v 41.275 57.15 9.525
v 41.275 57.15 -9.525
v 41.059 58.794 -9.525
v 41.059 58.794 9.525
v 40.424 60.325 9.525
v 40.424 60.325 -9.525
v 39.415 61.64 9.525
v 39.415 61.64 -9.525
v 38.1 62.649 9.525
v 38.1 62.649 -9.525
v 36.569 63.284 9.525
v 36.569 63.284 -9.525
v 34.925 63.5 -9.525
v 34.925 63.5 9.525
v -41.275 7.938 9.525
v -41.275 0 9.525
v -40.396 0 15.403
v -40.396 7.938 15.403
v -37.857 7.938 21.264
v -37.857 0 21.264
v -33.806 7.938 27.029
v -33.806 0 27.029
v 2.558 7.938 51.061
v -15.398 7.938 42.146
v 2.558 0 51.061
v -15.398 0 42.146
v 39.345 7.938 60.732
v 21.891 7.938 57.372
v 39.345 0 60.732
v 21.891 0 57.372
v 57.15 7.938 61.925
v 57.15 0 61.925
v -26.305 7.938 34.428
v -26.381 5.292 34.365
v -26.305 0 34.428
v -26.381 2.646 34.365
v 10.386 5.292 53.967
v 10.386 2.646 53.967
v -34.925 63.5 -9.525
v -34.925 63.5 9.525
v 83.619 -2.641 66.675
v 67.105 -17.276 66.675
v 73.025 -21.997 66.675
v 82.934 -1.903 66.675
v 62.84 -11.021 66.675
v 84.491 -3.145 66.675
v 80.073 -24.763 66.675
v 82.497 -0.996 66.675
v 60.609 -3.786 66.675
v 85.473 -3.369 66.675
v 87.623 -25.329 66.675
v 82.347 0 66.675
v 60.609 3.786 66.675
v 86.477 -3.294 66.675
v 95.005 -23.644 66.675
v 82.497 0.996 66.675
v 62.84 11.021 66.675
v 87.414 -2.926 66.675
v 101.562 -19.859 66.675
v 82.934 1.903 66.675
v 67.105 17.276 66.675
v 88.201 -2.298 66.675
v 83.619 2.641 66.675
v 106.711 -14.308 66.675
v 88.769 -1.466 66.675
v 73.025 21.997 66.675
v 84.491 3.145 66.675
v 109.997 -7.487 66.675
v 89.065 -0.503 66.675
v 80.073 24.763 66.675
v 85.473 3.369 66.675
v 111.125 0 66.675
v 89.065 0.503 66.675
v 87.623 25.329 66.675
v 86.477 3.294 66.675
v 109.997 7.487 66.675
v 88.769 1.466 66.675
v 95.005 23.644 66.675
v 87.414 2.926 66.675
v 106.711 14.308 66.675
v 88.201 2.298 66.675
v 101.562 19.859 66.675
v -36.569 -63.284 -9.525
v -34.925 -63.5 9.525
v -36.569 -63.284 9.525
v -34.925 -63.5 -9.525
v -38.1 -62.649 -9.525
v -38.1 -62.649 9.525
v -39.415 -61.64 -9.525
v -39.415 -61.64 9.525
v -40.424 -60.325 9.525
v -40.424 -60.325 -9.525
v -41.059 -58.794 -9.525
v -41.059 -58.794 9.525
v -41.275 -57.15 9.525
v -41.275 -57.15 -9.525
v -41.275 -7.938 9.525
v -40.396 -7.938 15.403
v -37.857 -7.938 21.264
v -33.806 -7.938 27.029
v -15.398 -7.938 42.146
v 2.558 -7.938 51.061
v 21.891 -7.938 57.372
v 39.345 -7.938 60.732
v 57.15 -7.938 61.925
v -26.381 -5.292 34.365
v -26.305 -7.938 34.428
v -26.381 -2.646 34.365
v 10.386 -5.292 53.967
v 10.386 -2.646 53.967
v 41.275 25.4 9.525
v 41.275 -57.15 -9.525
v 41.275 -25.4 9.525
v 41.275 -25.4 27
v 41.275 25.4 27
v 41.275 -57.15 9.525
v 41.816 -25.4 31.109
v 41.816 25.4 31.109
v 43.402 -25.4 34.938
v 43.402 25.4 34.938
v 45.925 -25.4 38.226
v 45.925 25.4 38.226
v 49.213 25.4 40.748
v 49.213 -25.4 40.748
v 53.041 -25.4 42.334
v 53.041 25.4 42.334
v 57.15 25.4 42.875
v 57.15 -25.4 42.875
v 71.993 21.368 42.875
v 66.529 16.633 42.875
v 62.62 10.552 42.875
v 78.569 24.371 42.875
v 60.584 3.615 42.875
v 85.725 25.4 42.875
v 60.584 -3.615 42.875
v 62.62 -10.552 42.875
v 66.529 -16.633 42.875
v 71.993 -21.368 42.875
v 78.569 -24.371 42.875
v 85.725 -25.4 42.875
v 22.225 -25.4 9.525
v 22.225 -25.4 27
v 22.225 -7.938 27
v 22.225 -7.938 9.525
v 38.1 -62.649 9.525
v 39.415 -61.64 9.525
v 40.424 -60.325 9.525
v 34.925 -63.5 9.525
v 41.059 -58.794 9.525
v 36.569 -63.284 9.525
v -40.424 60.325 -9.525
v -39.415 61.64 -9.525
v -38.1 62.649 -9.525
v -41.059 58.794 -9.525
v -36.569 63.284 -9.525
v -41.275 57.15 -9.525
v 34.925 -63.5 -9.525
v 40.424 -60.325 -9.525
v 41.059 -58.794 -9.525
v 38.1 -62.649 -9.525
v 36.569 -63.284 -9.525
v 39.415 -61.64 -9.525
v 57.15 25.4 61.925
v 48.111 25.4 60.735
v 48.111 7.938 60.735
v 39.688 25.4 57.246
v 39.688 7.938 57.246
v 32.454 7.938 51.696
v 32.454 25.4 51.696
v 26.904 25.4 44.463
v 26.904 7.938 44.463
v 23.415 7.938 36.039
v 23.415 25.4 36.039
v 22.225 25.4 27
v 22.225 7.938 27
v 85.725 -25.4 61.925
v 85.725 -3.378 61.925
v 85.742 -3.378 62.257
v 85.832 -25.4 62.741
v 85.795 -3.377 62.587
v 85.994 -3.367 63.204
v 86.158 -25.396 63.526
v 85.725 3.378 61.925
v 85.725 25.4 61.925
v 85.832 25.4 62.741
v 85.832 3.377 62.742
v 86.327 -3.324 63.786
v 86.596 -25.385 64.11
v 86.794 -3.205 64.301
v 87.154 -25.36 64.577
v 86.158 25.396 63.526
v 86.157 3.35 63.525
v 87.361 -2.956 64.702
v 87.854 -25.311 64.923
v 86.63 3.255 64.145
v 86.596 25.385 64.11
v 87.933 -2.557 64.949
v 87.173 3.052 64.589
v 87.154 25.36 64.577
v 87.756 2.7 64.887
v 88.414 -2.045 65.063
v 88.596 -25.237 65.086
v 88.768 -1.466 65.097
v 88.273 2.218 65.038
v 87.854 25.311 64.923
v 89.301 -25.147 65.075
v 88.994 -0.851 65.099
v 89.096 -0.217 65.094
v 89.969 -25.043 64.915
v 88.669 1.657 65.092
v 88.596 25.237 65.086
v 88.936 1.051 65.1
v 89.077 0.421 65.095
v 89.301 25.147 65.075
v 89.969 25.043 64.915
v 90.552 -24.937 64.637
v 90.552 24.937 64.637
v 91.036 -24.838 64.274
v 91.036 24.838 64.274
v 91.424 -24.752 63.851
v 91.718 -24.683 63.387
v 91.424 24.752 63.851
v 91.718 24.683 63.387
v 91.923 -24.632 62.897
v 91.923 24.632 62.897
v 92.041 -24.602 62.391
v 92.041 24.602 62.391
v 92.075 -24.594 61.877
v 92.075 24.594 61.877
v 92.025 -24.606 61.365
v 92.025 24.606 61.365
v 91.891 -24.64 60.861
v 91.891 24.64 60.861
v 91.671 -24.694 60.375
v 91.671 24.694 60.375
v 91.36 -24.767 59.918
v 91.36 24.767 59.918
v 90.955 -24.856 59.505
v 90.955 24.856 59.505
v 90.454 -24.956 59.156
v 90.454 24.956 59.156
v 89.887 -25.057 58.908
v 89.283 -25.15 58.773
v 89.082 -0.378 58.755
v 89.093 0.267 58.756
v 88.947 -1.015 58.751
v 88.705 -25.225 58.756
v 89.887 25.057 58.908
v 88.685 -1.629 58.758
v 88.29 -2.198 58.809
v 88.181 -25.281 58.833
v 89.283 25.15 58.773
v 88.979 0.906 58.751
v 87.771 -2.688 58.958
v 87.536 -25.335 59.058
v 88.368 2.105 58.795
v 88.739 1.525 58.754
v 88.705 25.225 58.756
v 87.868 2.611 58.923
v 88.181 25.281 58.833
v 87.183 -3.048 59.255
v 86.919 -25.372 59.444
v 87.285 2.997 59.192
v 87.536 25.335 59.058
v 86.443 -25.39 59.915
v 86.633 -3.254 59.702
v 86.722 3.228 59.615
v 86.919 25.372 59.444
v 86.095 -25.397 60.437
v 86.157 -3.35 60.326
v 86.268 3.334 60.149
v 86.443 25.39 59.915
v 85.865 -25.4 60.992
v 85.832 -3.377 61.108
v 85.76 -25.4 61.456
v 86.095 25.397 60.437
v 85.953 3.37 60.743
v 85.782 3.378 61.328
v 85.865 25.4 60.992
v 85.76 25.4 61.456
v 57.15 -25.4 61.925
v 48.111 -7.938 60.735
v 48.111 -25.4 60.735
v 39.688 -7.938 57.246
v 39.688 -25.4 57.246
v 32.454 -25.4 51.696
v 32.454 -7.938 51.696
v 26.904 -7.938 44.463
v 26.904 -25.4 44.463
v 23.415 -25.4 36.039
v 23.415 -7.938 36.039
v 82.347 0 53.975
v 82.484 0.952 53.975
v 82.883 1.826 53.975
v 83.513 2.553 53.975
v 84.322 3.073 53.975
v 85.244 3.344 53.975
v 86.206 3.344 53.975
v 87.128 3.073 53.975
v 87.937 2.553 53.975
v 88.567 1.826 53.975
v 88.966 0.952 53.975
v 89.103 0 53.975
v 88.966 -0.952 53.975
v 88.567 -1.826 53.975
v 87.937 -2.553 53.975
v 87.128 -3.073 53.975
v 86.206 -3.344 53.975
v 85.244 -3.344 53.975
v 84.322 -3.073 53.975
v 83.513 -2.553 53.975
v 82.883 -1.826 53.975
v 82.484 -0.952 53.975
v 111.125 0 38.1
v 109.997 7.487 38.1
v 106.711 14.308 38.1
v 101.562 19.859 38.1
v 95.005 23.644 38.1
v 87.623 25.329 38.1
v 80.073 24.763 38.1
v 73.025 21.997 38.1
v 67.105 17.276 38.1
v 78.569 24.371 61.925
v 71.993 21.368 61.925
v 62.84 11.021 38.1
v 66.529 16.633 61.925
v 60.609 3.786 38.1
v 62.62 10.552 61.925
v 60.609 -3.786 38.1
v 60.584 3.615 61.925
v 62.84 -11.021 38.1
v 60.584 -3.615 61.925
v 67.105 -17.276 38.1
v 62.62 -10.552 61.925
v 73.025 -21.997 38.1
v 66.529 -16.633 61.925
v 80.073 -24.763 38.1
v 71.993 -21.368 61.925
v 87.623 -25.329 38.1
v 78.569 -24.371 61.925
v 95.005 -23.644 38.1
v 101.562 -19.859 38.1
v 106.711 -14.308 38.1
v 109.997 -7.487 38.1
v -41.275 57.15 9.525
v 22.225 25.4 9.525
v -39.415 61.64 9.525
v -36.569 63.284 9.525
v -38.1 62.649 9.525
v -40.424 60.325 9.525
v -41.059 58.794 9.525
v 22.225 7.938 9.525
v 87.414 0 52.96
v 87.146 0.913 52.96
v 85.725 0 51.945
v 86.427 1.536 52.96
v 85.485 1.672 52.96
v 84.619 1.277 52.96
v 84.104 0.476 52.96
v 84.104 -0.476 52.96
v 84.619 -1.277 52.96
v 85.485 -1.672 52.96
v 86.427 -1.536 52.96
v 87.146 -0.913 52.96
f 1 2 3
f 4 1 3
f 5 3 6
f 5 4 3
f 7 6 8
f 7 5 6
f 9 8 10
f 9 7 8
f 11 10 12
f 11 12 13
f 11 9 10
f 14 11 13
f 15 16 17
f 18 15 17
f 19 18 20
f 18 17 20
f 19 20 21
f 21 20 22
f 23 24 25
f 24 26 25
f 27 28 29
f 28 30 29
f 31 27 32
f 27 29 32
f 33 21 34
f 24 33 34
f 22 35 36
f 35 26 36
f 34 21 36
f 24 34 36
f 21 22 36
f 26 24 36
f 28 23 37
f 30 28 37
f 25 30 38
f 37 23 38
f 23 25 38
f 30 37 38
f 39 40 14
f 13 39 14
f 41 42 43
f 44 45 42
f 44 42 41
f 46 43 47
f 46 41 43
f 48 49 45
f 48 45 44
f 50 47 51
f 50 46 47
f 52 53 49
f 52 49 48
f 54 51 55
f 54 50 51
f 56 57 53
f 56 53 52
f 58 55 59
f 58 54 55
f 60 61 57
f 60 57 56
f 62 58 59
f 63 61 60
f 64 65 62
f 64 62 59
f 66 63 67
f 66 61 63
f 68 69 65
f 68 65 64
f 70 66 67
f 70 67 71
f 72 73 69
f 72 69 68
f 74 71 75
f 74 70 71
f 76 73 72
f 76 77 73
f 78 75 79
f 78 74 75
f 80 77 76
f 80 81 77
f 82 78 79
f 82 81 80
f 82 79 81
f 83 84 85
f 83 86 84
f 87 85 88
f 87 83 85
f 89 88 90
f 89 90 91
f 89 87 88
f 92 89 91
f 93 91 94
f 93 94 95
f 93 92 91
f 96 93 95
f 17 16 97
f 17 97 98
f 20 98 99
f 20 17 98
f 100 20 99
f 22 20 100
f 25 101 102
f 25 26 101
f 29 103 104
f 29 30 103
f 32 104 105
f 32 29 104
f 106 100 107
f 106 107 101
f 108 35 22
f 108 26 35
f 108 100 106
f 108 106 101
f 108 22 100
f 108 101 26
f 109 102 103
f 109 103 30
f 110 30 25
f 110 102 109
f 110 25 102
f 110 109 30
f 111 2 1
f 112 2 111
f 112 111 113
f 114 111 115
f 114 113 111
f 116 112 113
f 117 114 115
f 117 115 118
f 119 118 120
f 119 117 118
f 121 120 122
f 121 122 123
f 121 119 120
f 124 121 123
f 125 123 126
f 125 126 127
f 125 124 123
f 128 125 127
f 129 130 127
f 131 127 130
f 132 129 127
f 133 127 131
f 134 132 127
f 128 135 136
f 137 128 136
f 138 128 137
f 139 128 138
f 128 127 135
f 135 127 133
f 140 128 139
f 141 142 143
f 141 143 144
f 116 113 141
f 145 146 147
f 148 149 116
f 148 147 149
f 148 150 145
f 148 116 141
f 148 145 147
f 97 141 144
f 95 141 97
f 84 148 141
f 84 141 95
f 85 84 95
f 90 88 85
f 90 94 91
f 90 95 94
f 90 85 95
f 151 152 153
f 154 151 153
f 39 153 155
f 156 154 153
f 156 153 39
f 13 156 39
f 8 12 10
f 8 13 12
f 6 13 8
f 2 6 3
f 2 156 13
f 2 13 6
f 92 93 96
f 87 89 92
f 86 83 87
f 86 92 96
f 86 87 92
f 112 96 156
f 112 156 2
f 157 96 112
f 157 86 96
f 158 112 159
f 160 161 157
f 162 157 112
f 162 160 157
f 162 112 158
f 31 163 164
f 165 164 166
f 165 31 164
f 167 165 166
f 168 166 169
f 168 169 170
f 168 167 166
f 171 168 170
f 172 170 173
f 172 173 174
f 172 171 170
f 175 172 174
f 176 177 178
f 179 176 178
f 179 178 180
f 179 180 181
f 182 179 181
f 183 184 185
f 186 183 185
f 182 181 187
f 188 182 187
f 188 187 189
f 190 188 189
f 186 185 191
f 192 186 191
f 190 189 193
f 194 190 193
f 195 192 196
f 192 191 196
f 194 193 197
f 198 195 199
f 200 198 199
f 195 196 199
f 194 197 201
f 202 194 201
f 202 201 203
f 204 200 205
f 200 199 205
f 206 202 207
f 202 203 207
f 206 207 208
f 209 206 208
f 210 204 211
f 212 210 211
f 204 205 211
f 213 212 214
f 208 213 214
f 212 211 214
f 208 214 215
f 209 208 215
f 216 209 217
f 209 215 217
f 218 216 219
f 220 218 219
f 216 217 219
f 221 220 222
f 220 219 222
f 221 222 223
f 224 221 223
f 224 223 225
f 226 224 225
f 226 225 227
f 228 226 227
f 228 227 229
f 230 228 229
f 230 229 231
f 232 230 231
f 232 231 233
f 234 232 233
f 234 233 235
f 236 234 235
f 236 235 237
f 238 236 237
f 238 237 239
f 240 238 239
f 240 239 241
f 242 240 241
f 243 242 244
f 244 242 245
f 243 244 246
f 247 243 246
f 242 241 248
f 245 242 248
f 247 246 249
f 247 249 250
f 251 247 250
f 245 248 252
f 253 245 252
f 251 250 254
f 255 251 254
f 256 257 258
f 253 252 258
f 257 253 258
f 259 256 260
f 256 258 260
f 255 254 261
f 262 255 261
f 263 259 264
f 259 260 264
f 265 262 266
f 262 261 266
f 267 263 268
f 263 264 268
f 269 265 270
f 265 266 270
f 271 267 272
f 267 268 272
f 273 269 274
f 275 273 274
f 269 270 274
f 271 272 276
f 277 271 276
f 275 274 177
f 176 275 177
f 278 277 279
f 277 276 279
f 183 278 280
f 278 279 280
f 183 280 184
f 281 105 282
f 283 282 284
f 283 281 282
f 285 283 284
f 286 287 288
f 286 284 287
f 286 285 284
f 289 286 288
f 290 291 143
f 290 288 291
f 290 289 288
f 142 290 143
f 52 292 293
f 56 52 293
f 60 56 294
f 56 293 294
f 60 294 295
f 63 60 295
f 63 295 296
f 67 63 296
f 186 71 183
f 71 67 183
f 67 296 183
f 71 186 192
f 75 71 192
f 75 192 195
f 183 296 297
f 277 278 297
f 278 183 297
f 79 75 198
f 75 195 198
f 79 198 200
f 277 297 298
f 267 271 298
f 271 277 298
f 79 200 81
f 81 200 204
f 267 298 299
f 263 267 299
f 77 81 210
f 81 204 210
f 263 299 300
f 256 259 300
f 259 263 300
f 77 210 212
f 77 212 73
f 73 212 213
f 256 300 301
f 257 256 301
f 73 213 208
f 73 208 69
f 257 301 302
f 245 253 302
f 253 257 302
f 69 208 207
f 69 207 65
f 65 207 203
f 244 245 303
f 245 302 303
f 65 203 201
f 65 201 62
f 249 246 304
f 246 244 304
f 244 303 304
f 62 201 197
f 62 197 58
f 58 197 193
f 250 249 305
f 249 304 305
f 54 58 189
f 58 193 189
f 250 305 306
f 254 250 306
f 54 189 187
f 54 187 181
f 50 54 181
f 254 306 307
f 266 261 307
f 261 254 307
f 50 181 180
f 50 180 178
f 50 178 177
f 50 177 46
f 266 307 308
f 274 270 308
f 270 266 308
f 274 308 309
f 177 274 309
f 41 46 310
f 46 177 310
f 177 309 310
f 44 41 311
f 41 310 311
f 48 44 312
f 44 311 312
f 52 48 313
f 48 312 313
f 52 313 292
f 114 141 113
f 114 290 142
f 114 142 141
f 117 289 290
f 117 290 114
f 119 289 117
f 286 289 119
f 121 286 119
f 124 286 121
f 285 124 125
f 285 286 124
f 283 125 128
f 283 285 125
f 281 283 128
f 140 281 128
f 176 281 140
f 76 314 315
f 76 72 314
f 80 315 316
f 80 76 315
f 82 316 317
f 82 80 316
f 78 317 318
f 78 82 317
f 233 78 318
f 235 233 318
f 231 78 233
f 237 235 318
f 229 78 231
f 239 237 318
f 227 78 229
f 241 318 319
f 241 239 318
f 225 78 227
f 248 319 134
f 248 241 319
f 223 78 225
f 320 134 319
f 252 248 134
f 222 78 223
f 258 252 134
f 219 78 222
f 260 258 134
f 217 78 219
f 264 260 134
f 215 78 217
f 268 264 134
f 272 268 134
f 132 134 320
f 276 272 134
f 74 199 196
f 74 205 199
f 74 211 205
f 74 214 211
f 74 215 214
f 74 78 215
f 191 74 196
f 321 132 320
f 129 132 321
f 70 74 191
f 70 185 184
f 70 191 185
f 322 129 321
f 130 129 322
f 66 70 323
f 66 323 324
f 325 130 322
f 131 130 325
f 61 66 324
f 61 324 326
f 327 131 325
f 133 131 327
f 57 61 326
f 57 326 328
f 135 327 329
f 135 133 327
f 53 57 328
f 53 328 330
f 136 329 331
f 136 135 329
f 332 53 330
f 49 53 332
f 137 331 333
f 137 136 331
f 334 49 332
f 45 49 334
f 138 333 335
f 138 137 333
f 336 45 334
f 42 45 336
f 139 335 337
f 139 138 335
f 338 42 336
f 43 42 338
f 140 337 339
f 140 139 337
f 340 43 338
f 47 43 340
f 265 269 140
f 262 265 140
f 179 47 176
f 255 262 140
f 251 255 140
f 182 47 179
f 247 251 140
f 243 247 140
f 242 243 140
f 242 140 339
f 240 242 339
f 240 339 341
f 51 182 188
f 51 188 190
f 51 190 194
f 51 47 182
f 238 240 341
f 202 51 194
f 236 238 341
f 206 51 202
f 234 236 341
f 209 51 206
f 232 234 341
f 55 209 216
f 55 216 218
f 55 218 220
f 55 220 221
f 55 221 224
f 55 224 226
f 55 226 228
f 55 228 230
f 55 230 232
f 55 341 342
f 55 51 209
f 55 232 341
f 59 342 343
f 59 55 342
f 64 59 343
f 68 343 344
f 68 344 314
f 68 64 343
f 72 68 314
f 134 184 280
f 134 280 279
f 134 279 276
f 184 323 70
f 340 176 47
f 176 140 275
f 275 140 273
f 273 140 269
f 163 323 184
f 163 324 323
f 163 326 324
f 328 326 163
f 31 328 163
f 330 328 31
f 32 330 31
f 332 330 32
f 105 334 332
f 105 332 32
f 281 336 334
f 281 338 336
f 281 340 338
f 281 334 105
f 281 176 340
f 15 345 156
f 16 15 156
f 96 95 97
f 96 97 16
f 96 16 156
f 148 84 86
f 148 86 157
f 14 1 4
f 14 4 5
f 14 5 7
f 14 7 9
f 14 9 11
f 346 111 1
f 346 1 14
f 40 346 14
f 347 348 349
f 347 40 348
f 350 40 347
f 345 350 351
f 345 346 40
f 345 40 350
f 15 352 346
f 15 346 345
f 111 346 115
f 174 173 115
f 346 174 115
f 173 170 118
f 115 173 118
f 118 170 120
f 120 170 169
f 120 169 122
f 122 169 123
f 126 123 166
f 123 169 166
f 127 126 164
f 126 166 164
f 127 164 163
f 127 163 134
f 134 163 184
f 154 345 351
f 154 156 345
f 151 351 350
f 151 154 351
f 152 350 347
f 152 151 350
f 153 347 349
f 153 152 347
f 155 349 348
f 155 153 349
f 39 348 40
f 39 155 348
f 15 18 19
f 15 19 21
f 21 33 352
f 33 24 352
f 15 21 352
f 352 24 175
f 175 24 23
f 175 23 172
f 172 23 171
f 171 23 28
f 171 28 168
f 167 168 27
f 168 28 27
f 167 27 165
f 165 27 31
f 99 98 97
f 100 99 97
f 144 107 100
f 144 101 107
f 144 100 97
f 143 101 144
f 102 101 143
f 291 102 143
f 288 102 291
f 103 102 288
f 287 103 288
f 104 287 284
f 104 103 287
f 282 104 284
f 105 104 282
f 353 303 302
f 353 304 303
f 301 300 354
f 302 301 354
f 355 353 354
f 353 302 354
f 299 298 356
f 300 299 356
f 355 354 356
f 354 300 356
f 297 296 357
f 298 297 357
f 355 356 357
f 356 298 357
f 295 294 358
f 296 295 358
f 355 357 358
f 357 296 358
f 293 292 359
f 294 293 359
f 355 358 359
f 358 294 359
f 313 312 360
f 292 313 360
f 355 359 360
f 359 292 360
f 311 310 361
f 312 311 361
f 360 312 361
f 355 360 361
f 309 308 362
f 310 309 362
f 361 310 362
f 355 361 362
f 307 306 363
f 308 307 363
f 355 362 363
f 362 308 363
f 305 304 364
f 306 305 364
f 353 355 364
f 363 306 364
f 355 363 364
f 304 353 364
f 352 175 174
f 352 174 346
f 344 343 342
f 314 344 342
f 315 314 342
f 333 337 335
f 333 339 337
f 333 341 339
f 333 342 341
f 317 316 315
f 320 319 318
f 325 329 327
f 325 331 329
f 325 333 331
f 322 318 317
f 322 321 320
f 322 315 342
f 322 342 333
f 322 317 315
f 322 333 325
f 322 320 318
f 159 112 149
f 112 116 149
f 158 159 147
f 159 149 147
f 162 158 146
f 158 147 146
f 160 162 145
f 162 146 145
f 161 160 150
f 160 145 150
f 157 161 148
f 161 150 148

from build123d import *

# Parameters (mm, degrees)
F1_DEPTH = 63.5
F0_W     = 25.4
F0_H     = 19.05
F2_DEPTH = 25.4
F3_DEPTH = 7.9375
F5_R     = 6.35
F7_D     = 6.7564
F7_DEPTH = 12.7
F7_TIP   = 2.0298273432
F9_D     = 6.35


with BuildPart() as f1:
    # F0 (on Front) → F1 (new body, symmetric)
    with BuildSketch(Plane.XZ):
        Polygon((41.275, -9.525), (41.275, 9.525), (22.225, 9.525), (-41.275, 9.525), (-41.275, -9.525), align=None)
    extrude(amount=F1_DEPTH, both=True)

    # F0 (on Front) → F2 (join, symmetric)
    with BuildSketch(Plane.XZ):
        with BuildLine():
            Line((22.225, 9.525), (41.275, 9.525))
            Line((41.275, 9.525), (41.275, 27.0002))
            ThreePointArc((41.275, 27.0002), (45.9246798487, 38.2255201513), (57.15, 42.8752))
            Line((57.15, 42.8752), (60.325, 42.8752))
            Line((60.325, 42.8752), (60.325, 61.9252))
            Line((60.325, 61.9252), (57.15, 61.9252))
            ThreePointArc((57.15, 61.9252), (32.4542956671, 51.6959043329), (22.225, 27.0002))
            Line((22.225, 27.0002), (22.225, 9.525))
        make_face()
        with Locations((73.025, 52.4002)):
            Rectangle(F0_W, F0_H)
    extrude(amount=F2_DEPTH, both=True)

    # F0 (on Front) → F3 (join, symmetric)
    with BuildSketch(Plane.XZ):
        with BuildLine():
            Line((-41.275, 9.525), (22.225, 9.525))
            Line((22.225, 9.525), (22.225, 27.0002))
            ThreePointArc((22.225, 27.0002), (32.4542956671, 51.6959043329), (57.15, 61.9252))
            add(Edge.make_bspline(
                [(-41.275, 9.525), (-41.275, 34.8479822278), (9.3457987532, 61.9252), (57.15, 61.9252)],
                knots=[0, 0, 0, 0, 111.5045361635, 111.5045361635, 111.5045361635, 111.5045361635], degree=3))
        make_face()
    extrude(amount=F3_DEPTH, both=True)

    # F0 (on Front) → F4 (revolve)
    with BuildSketch(Plane.XZ):
        Polygon((85.725, 61.9252), (85.725, 42.8752), (85.725, 38.1), (111.125, 38.1), (111.125, 66.675), (85.725, 66.675), align=None)
    revolve(axis=Axis((85.725, 0, 52.3875), (0, 0, 1)))

    # F5
    f5_edges = [f1.edges().sort_by_distance(p)[0] for p in [
        (41.275, -63.5, 0),
        (-41.275, -63.5, 0),
        (41.275, 63.5, 0),
        (-41.275, 63.5, 0),
    ]]
    fillet(f5_edges, radius=F5_R)

    # F7
    with Locations(Plane.XY.offset(66.675)):
        with Locations((85.725, 0)):
            Hole(F7_D / 2, depth=F7_DEPTH)
            with Locations((0, 0, -(F7_DEPTH + F7_TIP / 2))):  # 118° drill point
                Cone(0, F7_D / 2, F7_TIP, mode=Mode.SUBTRACT)

    # F9 (through all)
    with Locations(Plane.XZ.offset(25.4)):
        with Locations((88.9, 61.9252)):
            Hole(F9_D / 2)


solid = f1.part
